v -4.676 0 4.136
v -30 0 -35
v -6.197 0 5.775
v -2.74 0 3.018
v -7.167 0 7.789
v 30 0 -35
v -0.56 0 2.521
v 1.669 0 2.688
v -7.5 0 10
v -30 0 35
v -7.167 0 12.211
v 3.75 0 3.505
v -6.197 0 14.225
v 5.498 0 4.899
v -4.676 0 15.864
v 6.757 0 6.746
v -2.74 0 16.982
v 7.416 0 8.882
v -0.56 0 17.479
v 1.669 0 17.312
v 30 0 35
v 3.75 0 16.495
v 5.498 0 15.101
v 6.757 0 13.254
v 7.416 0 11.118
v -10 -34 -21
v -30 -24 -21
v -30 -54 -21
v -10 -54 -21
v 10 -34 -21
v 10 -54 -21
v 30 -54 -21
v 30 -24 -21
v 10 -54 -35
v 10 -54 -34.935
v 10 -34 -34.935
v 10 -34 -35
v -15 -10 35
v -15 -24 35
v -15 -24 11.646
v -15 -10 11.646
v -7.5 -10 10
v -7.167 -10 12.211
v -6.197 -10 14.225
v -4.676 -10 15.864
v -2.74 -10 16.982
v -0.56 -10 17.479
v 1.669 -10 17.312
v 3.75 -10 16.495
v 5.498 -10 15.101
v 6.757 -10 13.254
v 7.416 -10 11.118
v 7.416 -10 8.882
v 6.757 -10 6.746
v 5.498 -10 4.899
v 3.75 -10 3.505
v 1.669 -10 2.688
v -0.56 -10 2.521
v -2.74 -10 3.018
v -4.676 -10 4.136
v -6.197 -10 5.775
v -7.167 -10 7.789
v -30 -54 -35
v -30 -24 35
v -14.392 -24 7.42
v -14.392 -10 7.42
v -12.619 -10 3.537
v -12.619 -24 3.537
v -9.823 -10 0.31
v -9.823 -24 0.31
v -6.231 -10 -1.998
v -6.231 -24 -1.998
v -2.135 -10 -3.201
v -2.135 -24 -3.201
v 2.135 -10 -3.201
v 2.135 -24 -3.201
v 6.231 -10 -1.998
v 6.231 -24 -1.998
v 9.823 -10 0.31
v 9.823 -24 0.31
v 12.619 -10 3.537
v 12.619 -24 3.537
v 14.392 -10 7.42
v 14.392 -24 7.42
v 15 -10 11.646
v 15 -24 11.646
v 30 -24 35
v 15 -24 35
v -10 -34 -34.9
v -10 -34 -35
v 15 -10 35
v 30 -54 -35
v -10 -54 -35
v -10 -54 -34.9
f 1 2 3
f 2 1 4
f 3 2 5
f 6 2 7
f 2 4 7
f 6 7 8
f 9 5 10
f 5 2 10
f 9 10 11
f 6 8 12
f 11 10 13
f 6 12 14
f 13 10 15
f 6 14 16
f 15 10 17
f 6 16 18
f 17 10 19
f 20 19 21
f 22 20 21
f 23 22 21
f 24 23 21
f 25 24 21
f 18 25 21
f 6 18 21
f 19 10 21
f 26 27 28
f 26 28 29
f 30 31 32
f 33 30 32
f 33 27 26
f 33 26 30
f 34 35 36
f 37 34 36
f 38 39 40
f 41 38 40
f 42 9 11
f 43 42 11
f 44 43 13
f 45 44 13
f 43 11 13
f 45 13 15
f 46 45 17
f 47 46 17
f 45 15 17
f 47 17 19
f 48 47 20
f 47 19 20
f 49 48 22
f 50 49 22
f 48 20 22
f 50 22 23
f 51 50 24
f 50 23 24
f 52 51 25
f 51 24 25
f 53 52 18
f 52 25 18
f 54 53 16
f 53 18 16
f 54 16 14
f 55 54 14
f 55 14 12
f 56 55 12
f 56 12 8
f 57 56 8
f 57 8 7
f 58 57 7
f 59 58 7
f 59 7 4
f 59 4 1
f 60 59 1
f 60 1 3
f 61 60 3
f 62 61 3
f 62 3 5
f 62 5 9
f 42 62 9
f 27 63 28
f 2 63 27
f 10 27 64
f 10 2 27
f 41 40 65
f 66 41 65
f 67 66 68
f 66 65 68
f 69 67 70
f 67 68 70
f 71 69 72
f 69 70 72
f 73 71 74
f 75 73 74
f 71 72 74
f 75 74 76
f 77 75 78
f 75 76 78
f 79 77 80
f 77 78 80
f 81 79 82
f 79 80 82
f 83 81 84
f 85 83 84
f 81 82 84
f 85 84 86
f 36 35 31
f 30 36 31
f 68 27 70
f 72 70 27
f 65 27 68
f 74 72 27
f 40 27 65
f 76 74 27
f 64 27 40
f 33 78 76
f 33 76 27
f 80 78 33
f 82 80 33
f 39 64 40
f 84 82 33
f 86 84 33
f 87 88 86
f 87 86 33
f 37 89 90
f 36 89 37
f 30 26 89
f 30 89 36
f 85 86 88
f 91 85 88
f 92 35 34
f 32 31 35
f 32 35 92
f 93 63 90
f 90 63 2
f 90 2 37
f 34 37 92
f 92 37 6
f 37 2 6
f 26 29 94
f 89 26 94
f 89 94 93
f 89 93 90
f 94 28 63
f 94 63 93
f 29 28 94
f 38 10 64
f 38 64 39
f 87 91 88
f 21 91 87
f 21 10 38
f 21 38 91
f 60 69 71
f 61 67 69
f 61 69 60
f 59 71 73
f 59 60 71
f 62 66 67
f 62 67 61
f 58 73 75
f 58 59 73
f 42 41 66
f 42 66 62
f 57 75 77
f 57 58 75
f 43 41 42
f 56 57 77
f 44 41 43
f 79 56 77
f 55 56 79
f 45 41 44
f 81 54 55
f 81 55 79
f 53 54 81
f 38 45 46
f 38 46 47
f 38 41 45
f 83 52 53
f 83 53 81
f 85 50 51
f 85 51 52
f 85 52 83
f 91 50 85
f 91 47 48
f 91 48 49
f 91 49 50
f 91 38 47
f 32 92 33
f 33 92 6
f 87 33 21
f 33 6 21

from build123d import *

# Parameters (mm, degrees)
F0_W      = 60
F0_H      = 70
F1_DEPTH  = 24
F3_DEPTH  = 14
F4_R      = 7.5
F5_DEPTH  = 24.001
F6_W      = 60
F6_H      = 14
F7_DEPTH  = 30
F10_DEPTH = 20
F11_DEPTH = 0.1359600746


with BuildPart() as f1:
    # F0 (on Front) → F1 (new body)
    with BuildSketch(Plane.XZ):
        Rectangle(F0_W, F0_H)
    extrude(amount=F1_DEPTH)

    # F2 (on face) → F3 (cut)
    with BuildSketch(Plane.XZ.offset(24)):
        with BuildLine():
            Line((15, 35), (-15, 35))
            Line((-15, 35), (-15, 11.6464606471))
            ThreePointArc((-15, 11.6464606471), (0, -3.3535393529), (15, 11.6464606471))
            Line((15, 11.6464606471), (15, 35))
        make_face()
    extrude(amount=-F3_DEPTH, mode=Mode.SUBTRACT)

    # F4 (on face) → F5 (cut, through all)
    with BuildSketch(Plane(origin=(0, 0, 0), x_dir=(-1, 0, 0), z_dir=(0, 1, 0))):
        with Locations((0, 10)):
            Circle(F4_R)
    extrude(amount=-F5_DEPTH, mode=Mode.SUBTRACT)

    # F6 (on face) → F7 (join)
    with BuildSketch(Plane.XZ.offset(24)):
        with Locations((0, -28)):
            Rectangle(F6_W, F6_H)
    extrude(amount=F7_DEPTH)

    # F9 (on face) → F10 (cut)
    with BuildSketch(Plane.XZ.offset(54)):
        Polygon((10, -21), (-9.999969219, -21), (-9.999969219, -34.9001288414), (10, -34.9352178571), align=None)
    extrude(amount=-F10_DEPTH, mode=Mode.SUBTRACT)

    # F11 (cut, through all): a face of the model
    f11_faces = [f1.faces().sort_by_distance(p)[0] for p in [
        (1.53905e-05, -44, -34.9176733492),
    ]]
    extrude(f11_faces, amount=-F11_DEPTH, mode=Mode.SUBTRACT)


solid = f1.part
